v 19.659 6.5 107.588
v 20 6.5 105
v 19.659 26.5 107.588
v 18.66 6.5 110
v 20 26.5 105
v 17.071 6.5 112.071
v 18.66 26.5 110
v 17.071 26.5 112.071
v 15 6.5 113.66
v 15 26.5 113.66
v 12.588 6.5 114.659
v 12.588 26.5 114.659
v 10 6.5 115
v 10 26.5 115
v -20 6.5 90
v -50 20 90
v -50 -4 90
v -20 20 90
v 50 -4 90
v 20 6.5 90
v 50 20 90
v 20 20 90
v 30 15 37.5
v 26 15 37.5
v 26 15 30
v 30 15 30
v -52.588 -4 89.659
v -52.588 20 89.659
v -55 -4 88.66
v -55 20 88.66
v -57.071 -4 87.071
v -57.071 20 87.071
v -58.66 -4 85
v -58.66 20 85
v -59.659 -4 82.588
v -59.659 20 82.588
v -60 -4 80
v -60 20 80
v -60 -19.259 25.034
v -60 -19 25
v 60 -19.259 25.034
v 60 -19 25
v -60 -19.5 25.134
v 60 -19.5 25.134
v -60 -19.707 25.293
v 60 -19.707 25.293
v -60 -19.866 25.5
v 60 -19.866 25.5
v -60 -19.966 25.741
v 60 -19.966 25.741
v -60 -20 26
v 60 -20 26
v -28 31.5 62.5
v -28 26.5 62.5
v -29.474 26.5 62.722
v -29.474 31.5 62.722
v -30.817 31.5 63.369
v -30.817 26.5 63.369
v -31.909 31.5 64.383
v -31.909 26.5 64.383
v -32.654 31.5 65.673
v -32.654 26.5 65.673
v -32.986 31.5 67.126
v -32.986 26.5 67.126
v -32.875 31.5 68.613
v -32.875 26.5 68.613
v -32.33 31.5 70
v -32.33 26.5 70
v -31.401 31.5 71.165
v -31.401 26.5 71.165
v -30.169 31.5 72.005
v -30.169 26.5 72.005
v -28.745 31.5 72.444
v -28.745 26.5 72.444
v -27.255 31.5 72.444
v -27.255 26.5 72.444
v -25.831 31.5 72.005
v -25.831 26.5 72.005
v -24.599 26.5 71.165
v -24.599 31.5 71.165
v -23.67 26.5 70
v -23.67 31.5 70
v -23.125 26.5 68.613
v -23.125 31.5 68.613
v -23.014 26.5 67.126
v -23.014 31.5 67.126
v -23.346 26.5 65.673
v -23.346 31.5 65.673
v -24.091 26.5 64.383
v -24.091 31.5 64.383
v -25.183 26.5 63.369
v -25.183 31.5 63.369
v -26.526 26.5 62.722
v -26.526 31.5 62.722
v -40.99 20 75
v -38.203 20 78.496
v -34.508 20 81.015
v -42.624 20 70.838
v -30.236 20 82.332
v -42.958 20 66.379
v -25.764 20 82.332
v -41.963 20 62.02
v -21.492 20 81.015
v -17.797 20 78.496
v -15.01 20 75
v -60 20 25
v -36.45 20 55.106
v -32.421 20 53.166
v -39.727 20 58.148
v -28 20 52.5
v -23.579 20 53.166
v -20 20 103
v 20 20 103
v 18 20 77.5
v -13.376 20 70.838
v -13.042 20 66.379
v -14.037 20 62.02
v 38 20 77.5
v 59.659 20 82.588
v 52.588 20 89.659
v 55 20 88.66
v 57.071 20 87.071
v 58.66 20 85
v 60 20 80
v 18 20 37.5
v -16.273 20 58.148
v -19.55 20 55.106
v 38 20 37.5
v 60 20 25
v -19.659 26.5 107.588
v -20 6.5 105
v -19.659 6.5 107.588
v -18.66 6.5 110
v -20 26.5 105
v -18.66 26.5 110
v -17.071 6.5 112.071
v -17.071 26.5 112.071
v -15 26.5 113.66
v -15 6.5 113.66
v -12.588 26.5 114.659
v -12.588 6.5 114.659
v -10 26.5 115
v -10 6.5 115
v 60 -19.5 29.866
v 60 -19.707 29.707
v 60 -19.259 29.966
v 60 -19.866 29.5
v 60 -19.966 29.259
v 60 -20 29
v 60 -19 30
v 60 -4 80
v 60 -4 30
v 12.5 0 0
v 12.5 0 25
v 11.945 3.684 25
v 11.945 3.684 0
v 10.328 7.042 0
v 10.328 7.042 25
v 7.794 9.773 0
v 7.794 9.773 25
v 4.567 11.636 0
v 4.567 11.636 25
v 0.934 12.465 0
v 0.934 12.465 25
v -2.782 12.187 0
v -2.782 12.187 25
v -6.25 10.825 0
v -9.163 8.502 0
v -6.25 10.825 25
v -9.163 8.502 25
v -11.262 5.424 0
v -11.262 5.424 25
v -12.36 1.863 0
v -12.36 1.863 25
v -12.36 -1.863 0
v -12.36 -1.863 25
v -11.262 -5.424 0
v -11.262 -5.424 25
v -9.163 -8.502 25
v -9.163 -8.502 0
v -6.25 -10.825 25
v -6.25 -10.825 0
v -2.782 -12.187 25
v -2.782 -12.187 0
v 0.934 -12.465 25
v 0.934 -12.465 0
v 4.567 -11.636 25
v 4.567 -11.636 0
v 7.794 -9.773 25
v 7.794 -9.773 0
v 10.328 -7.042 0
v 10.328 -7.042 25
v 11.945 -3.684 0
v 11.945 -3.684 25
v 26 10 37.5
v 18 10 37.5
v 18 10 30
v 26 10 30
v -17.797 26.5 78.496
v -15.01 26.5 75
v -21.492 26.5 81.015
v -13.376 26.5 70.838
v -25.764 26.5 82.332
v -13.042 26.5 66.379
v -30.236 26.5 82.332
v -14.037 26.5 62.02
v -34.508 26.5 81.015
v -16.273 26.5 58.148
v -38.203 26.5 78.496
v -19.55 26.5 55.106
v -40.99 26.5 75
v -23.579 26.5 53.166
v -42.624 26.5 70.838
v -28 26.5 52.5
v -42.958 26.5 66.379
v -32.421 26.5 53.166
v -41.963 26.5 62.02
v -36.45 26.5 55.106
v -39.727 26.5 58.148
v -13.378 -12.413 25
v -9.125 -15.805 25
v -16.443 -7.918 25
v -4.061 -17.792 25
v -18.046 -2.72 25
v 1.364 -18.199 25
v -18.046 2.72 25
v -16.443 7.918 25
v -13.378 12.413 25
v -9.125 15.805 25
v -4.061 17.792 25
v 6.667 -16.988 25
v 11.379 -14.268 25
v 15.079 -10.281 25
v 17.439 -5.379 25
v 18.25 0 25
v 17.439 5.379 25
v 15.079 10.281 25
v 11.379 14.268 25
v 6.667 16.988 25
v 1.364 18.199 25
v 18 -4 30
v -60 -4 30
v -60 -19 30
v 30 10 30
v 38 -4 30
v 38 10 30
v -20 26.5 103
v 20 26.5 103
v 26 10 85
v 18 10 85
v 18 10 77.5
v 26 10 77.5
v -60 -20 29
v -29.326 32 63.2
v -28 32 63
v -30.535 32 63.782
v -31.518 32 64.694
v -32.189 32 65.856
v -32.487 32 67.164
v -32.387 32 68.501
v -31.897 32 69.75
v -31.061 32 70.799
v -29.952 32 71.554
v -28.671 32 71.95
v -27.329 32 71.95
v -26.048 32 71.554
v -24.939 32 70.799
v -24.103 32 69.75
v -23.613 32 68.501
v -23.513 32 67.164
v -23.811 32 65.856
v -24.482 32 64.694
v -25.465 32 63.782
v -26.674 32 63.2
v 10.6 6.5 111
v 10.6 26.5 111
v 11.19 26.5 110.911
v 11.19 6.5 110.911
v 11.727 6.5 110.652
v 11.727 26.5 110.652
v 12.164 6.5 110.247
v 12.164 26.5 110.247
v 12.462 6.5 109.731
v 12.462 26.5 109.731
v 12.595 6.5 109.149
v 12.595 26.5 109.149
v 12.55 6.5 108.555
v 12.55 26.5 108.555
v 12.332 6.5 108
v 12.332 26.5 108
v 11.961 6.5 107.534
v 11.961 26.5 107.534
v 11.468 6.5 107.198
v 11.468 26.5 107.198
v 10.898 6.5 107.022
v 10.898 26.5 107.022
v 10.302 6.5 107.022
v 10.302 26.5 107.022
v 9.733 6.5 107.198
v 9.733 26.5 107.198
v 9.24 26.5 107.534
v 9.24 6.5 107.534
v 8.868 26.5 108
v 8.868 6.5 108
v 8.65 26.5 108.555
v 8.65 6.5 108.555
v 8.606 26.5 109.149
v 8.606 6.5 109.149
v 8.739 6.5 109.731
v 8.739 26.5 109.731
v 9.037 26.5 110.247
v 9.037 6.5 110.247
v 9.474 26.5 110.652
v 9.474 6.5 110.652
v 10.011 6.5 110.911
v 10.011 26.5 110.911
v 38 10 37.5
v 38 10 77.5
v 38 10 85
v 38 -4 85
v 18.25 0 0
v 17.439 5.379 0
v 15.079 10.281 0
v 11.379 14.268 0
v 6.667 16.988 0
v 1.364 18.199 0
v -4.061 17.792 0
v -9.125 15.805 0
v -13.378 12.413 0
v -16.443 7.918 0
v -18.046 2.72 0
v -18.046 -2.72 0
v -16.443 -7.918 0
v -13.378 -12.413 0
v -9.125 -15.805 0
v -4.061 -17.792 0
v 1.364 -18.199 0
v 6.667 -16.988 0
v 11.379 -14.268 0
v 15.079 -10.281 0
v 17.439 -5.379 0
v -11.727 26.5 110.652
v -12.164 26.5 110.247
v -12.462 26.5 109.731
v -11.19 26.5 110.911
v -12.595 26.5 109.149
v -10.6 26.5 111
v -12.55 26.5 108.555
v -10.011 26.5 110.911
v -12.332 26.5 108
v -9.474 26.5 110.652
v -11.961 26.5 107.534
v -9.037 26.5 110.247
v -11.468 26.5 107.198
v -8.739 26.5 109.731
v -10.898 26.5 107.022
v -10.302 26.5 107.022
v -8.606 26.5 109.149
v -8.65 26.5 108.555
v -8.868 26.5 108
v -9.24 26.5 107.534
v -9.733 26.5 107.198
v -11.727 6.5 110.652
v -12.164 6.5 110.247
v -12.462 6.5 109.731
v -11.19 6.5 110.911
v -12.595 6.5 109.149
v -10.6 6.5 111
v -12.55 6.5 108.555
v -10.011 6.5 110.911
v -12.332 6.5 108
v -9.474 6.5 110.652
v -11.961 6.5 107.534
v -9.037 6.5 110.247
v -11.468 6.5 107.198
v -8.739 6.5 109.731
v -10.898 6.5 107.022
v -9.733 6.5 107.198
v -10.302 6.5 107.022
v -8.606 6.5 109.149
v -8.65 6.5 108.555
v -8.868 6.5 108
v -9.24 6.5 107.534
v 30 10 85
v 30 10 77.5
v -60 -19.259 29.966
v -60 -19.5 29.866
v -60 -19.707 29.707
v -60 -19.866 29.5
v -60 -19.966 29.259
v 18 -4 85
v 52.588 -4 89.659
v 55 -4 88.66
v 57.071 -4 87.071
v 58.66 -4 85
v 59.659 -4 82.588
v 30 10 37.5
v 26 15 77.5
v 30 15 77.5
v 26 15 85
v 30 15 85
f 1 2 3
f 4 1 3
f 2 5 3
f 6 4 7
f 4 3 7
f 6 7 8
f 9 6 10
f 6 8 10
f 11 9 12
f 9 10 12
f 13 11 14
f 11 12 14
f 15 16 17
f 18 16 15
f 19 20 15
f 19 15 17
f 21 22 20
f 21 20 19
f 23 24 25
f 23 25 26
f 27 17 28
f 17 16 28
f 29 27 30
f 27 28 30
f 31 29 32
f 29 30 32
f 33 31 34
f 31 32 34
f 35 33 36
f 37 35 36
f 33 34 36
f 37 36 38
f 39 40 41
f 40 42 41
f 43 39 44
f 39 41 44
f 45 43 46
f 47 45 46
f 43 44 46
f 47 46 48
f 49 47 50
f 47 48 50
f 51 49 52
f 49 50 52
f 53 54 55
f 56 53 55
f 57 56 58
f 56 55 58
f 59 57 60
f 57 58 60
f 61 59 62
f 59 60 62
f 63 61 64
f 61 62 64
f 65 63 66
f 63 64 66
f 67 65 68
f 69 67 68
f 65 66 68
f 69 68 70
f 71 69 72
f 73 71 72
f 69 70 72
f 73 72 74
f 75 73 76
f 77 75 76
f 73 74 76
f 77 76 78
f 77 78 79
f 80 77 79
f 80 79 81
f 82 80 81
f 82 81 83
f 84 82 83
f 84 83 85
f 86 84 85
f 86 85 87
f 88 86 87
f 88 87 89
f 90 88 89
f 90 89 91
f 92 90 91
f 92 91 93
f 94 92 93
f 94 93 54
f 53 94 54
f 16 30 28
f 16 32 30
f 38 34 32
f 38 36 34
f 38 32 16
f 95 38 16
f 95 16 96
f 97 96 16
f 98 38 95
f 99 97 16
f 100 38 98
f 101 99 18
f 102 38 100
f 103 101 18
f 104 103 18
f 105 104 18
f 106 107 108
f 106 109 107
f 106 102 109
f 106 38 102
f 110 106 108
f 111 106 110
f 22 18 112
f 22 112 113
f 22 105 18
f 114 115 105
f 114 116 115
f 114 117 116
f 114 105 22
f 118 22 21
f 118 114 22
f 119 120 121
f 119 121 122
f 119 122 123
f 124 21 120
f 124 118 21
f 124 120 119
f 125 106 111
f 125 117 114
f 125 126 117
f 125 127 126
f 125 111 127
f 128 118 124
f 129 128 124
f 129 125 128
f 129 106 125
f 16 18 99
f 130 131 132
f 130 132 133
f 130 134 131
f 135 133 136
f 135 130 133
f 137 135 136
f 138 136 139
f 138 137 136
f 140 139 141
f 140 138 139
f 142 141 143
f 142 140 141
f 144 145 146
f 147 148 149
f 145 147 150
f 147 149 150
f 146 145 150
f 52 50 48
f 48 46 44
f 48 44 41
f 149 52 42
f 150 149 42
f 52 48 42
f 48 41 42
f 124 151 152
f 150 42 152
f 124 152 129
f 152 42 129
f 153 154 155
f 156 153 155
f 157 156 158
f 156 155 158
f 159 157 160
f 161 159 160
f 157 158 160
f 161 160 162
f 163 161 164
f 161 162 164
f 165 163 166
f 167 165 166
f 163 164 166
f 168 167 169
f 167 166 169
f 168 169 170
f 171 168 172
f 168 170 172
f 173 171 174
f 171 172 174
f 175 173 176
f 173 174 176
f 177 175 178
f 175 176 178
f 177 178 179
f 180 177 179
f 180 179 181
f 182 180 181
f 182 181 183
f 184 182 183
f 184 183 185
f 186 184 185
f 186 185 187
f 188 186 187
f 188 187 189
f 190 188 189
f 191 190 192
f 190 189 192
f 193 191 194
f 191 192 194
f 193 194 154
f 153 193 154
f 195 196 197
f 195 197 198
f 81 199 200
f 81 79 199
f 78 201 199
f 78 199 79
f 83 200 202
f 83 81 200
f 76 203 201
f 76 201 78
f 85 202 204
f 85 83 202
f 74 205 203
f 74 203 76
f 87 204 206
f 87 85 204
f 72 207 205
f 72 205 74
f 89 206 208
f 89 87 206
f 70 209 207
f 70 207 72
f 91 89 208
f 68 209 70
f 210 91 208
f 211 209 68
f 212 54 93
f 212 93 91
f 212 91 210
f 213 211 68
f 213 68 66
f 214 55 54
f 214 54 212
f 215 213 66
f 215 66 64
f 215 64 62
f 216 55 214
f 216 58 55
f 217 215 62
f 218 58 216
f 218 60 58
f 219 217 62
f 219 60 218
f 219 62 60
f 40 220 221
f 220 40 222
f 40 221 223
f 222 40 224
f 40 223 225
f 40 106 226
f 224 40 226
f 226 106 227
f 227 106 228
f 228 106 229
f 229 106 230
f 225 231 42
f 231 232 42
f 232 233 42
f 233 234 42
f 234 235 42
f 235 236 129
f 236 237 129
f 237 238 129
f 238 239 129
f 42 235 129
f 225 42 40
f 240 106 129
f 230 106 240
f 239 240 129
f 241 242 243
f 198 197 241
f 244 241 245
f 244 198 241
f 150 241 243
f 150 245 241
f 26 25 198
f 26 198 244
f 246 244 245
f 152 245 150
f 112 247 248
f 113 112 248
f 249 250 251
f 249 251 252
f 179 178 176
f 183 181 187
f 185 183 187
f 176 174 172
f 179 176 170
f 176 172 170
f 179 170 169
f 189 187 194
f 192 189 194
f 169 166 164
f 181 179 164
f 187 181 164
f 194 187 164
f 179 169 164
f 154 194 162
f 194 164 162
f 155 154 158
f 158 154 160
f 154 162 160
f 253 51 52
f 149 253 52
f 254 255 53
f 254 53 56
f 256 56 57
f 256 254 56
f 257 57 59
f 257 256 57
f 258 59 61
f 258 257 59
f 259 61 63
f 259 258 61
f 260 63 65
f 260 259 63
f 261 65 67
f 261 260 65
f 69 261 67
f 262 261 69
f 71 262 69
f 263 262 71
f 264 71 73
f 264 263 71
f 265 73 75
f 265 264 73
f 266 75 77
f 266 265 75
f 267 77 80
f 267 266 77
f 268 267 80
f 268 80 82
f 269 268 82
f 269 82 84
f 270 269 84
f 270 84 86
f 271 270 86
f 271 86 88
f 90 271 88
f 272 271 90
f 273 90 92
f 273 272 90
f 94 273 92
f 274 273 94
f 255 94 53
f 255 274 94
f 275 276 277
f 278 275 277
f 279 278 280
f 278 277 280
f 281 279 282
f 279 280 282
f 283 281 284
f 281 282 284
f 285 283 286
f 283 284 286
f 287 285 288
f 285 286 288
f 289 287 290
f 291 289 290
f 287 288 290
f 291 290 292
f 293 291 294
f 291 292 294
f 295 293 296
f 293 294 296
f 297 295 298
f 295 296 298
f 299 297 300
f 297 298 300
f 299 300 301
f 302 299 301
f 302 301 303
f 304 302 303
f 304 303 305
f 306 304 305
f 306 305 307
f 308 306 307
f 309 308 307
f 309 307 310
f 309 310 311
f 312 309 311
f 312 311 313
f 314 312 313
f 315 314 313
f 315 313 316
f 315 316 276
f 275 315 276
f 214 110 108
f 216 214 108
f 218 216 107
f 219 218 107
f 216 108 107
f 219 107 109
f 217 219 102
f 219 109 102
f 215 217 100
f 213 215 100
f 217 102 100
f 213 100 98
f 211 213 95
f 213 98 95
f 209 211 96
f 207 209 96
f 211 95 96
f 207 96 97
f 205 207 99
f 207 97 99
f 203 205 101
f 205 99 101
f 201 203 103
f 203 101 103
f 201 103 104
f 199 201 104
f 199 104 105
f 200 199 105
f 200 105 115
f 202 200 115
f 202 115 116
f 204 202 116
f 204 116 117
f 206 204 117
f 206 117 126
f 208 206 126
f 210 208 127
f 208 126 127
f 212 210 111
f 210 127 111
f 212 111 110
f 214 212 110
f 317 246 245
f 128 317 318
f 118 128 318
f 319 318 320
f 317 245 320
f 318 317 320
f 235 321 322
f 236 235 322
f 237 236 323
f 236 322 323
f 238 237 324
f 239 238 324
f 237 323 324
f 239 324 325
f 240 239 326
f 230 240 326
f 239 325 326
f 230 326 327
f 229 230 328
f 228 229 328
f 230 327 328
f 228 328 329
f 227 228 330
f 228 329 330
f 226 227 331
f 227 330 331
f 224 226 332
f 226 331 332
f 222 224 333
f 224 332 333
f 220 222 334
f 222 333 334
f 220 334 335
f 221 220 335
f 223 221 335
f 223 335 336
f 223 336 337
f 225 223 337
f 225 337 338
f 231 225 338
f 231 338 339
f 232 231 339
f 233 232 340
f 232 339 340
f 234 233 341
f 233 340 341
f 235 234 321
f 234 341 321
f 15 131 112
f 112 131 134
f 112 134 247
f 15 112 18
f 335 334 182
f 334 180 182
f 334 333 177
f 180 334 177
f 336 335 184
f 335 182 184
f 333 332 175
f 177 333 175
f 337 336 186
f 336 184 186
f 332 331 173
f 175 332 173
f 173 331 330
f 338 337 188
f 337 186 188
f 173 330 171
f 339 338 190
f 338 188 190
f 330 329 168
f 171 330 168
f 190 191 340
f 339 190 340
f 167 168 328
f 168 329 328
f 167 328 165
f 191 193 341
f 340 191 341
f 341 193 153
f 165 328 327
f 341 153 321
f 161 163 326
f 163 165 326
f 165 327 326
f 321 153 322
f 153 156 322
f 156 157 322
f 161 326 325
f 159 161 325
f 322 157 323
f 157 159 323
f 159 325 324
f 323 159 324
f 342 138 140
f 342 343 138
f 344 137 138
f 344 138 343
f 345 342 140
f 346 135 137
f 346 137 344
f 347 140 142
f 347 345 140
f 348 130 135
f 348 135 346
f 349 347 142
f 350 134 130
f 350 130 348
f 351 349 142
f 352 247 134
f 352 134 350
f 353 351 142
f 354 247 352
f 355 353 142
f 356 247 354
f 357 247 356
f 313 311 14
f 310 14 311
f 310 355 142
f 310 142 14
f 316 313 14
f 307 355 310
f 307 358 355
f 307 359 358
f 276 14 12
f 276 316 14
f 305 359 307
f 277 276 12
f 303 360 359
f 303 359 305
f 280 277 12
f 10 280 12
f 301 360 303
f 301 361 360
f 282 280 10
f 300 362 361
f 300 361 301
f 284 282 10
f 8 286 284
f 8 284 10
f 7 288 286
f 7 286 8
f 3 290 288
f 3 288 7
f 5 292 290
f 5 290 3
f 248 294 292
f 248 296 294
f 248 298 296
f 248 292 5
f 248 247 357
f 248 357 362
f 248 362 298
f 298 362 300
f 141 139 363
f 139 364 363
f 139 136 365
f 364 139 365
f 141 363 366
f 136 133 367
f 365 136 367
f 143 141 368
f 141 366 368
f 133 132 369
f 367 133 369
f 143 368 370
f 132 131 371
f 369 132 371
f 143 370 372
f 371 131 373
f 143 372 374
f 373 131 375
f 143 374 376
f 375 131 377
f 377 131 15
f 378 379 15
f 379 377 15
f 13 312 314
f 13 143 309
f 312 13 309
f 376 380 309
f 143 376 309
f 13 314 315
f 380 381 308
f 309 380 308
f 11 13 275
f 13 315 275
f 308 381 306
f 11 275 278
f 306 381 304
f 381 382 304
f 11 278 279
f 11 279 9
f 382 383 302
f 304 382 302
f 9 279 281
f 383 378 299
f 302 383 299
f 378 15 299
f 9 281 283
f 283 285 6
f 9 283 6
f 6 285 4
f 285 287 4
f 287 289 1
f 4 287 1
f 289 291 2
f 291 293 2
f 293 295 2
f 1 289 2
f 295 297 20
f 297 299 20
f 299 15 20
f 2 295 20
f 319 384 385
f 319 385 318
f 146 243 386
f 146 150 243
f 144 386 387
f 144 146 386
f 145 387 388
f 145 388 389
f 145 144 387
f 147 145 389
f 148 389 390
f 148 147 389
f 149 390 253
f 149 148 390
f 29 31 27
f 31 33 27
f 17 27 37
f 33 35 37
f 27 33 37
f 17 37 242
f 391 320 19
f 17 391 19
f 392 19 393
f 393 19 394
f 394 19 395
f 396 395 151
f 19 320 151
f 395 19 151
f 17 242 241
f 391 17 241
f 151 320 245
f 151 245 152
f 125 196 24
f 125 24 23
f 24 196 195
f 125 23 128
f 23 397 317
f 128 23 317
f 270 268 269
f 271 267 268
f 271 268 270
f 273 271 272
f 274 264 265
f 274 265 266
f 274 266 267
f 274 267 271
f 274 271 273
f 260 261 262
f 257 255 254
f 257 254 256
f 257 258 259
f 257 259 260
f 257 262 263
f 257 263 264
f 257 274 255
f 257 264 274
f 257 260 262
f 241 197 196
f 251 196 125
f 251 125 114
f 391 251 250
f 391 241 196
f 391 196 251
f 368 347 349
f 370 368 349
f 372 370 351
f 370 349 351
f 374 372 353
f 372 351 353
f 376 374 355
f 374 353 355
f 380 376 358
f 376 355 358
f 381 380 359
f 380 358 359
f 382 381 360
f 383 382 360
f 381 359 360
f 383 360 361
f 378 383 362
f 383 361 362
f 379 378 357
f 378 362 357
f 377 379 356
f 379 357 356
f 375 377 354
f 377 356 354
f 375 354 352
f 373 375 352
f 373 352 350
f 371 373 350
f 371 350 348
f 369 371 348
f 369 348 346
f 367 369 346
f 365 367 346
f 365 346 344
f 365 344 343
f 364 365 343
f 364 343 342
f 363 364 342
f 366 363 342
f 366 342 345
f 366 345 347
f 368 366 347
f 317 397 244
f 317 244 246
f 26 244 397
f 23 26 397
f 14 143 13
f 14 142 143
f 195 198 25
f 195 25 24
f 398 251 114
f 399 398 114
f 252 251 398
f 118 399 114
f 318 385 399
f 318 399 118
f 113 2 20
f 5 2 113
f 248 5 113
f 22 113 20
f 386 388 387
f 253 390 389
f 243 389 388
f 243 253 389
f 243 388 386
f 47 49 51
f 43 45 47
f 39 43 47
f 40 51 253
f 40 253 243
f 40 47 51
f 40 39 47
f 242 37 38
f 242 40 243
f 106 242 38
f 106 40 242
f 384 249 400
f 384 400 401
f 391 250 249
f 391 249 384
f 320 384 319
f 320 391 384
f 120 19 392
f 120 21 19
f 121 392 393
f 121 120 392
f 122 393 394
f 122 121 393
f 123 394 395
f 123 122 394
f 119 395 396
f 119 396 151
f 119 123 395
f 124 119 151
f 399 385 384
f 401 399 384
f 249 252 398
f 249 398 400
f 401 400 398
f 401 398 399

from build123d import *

# Parameters (mm, degrees)
SKETCH_1_R               = 18.25
EXTRUDE_1_DEPTH          = 25
SKETCH_2_R               = 12.5
CUT_EXTRUDE_1_DEPTH      = 25
SKETCH_3_W               = 120
SKETCH_3_H               = 40
EXTRUDE_2_DEPTH          = 65
SKETCH_5_W               = 20
SKETCH_5_H               = 55
CUT_EXTRUDE_2_DEPTH      = 30
SKETCH_6_W               = 20
SKETCH_6_H               = 40
CUT_EXTRUDE_3_DEPTH      = 30
SKETCH_7_W               = 4
SKETCH_7_H               = 55
CUT_EXTRUDE_4_DEPTH      = 5
SKETCH_8_R               = 5
EXTRUDE_4_DEPTH          = 12
CUT_EXTRUDE_5_DEPTH      = 113.800709218
CUT_EXTRUDE_5_DEPTH_BACK = 60
SKETCH_9_W               = 120
SKETCH_9_H               = 16
SKETCH_10_W              = 40
SKETCH_10_H              = 25
EXTRUDE_5_DEPTH          = 13.5
SKETCH_13_R              = 2
CUT_EXTRUDE_6_DEPTH      = 30
SKETCH_14_R              = 15
EXTRUDE_6_DEPTH          = 6.5
EXTRUDE_START            = 6.5
SKETCH_15_W              = 40
SKETCH_15_H              = 12
SKETCH_15_R              = 2
EXTRUDE_7_DEPTH          = 6.5
FILLET_1_R               = 10
FILLET_2_R               = 10
FILLET_3_R               = 1
CHAMFER_1_SIZE           = 0.5


with BuildPart() as part:
    # 草图1 → 凸台-拉伸1 (new body)
    with BuildSketch(Plane.XY):
        Circle(SKETCH_1_R)
    extrude(amount=EXTRUDE_1_DEPTH)

    # 草图2 → 切除-拉伸1 (cut)
    with BuildSketch(Plane.XY.offset(25)):
        Circle(SKETCH_2_R)
    extrude(amount=-CUT_EXTRUDE_1_DEPTH, mode=Mode.SUBTRACT)

    # 草图3 → 凸台-拉伸2 (add)
    with BuildSketch(Plane.XY.offset(25)):
        Rectangle(SKETCH_3_W, SKETCH_3_H)
    extrude(amount=EXTRUDE_2_DEPTH)

    # 草图5 → 切除-拉伸2 (cut)
    with BuildSketch(Plane.XZ.offset(20)):
        with Locations((28, 57.5)):
            Rectangle(SKETCH_5_W, SKETCH_5_H)
    extrude(amount=-CUT_EXTRUDE_2_DEPTH, mode=Mode.SUBTRACT)

    # 草图6 → 切除-拉伸3 (cut)
    with BuildSketch(Plane.XZ.offset(-10)):
        with Locations((28, 57.5)):
            Rectangle(SKETCH_6_W, SKETCH_6_H)
    extrude(amount=-CUT_EXTRUDE_3_DEPTH, mode=Mode.SUBTRACT)

    # 草图7 → 切除-拉伸4 (cut)
    with BuildSketch(Plane.XZ.offset(-10)):
        with Locations((28, 57.5)):
            Rectangle(SKETCH_7_W, SKETCH_7_H)
    extrude(amount=-CUT_EXTRUDE_4_DEPTH, mode=Mode.SUBTRACT)

    # 草图8 → 凸台-拉伸4 (add)
    with BuildSketch(Plane(origin=(0, 20, 0), x_dir=(1, 0, 0), z_dir=(0, 1, 0))):
        with Locations(Location((-28, -67.5, 0), (0, 0, 90))):
            Circle(SKETCH_8_R)
    extrude(amount=EXTRUDE_4_DEPTH)

    # 草图9 → 切除-拉伸5 (cut, two sides: drawn at the far end of the back side and taken through both)
    with BuildSketch(Plane.XY.offset(90).offset(-CUT_EXTRUDE_5_DEPTH_BACK)):
        with Locations((0, -12)):
            Rectangle(SKETCH_9_W, SKETCH_9_H)
    extrude(amount=CUT_EXTRUDE_5_DEPTH + CUT_EXTRUDE_5_DEPTH_BACK, mode=Mode.SUBTRACT)

    # 草图10 → 凸台-拉伸5 (add)
    with BuildSketch(Plane(origin=(0, 20, 0), x_dir=(1, 0, 0), z_dir=(0, 1, 0))):
        with Locations((0, -102.5)):
            Rectangle(SKETCH_10_W, SKETCH_10_H)
    extrude(amount=-EXTRUDE_5_DEPTH)

    # 草图13 → 切除-拉伸6 (cut)
    with BuildSketch(Plane(origin=(0, 20, 0), x_dir=(1, 0, 0), z_dir=(0, 1, 0))):
        with Locations(Location((-10.600287359, -109, 0), (0, 0, 270))):
            Circle(SKETCH_13_R)
        with Locations(Location((10.600287359, -109, 0), (0, 0, 270))):
            Circle(SKETCH_13_R)
    extrude(amount=-CUT_EXTRUDE_6_DEPTH, mode=Mode.SUBTRACT)

    # 草图14 → 凸台-拉伸6 (add)
    with BuildSketch(Plane(origin=(0, 20, 0), x_dir=(1, 0, 0), z_dir=(0, 1, 0))):
        with Locations(Location((-28, -67.5, 0), (0, 0, 90))):
            Circle(SKETCH_14_R)
    extrude(amount=EXTRUDE_6_DEPTH)

    # 草图15 → 凸台-拉伸7 (add)
    with BuildSketch(Plane(origin=(0, 20, 0), x_dir=(1, 0, 0), z_dir=(0, 1, 0)).offset(EXTRUDE_START)):
        with Locations((0, -109)):
            Rectangle(SKETCH_15_W, SKETCH_15_H)
        with Locations(Location((-10.600287359, -109, 0), (0, 0, 270))):
            Circle(SKETCH_15_R, mode=Mode.SUBTRACT)
        with Locations(Location((10.600287359, -109, 0), (0, 0, 270))):
            Circle(SKETCH_15_R, mode=Mode.SUBTRACT)
    extrude(amount=-EXTRUDE_7_DEPTH)

    # 圆角1
    fillet_1_edges = [part.edges().sort_by_distance(p)[0] for p in [
        (-20, 16.5, 115),
        (20, 16.5, 115),
    ]]
    fillet(fillet_1_edges, radius=FILLET_1_R)

    # 圆角2
    fillet_2_edges = [part.edges().sort_by_distance(p)[0] for p in [
        (60, 8, 90),
        (-60, 8, 90),
    ]]
    fillet(fillet_2_edges, radius=FILLET_2_R)

    # 圆角3
    fillet_3_edges = [part.edges().sort_by_distance(p)[0] for p in [
        (0, -20, 25),
        (0, -20, 30),
    ]]
    fillet(fillet_3_edges, radius=FILLET_3_R)

    # 倒角1
    chamfer_1_edges = [part.edges().sort_by_distance(p)[0] for p in [
        (-28, 32, 72.5),
    ]]
    chamfer(chamfer_1_edges, length=CHAMFER_1_SIZE)


solid = part.part
